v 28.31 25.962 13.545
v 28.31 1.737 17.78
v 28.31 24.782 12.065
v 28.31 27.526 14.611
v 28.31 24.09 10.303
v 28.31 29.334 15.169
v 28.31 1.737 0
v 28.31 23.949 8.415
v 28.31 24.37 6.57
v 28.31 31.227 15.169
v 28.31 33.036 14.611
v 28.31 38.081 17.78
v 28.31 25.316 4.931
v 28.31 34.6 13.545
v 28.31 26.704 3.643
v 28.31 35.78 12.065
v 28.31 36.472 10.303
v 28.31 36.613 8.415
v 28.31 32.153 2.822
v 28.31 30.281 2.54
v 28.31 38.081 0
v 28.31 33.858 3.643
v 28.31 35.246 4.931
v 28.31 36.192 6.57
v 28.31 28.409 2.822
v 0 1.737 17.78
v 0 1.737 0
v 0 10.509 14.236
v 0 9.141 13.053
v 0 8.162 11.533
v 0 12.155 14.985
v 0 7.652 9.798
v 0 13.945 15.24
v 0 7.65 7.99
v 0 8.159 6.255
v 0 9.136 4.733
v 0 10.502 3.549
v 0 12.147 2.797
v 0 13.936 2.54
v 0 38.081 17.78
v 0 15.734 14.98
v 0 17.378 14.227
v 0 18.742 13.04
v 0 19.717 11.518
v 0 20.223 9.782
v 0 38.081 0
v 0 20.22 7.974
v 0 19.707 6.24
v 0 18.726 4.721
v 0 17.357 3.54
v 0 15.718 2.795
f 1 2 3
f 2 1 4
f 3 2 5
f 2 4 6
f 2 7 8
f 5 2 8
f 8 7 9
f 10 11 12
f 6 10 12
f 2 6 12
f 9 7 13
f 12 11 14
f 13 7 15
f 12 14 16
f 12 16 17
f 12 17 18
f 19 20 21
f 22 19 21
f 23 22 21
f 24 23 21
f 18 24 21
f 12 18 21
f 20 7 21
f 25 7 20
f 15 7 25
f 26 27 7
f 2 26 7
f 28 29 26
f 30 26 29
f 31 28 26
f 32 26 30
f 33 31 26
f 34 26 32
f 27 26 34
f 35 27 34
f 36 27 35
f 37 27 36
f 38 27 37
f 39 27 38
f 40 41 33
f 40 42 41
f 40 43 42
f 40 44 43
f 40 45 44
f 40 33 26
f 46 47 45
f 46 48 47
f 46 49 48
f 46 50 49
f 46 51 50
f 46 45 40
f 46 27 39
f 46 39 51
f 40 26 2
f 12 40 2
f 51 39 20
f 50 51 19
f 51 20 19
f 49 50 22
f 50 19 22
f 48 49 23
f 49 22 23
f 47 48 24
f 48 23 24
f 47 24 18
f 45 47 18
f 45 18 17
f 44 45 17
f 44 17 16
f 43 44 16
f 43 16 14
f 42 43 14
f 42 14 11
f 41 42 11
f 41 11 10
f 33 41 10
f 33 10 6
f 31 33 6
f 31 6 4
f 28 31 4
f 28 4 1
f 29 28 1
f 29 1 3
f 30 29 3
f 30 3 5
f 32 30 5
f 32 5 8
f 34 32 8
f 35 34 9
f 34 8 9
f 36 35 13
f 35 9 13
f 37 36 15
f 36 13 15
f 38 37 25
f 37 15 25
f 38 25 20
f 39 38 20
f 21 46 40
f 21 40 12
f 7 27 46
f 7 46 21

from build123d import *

# Parameters (mm, degrees)
SKETCH1_W           = 28.309650982
SKETCH1_H           = 36.344172283
BOSS_EXTRUDE1_DEPTH = 17.78
SKETCH2_R           = 6.35
CUT_EXTRUDE2_DEPTH  = 37.746201309


with BuildPart() as part:
    # Sketch1 → Boss-Extrude1 (new body)
    with BuildSketch(Plane.XY):
        with Locations((14.154825491, 19.909123788)):
            Rectangle(SKETCH1_W, SKETCH1_H)
    extrude(amount=BOSS_EXTRUDE1_DEPTH)

    # Sketch2 → Cut-Extrude2 (cut, along a direction that is not the sketch's normal)
    with BuildSketch(Plane(origin=(28.309650982, 0, 0), x_dir=(0, 0, -1), z_dir=(1, 0, 0))):
        with Locations((-8.89, 30.280911184)):
            Circle(SKETCH2_R)
    extrude(amount=-CUT_EXTRUDE2_DEPTH, dir=(0.866025403784438, 0.5000000000000011, 0), mode=Mode.SUBTRACT)


solid = part.part
